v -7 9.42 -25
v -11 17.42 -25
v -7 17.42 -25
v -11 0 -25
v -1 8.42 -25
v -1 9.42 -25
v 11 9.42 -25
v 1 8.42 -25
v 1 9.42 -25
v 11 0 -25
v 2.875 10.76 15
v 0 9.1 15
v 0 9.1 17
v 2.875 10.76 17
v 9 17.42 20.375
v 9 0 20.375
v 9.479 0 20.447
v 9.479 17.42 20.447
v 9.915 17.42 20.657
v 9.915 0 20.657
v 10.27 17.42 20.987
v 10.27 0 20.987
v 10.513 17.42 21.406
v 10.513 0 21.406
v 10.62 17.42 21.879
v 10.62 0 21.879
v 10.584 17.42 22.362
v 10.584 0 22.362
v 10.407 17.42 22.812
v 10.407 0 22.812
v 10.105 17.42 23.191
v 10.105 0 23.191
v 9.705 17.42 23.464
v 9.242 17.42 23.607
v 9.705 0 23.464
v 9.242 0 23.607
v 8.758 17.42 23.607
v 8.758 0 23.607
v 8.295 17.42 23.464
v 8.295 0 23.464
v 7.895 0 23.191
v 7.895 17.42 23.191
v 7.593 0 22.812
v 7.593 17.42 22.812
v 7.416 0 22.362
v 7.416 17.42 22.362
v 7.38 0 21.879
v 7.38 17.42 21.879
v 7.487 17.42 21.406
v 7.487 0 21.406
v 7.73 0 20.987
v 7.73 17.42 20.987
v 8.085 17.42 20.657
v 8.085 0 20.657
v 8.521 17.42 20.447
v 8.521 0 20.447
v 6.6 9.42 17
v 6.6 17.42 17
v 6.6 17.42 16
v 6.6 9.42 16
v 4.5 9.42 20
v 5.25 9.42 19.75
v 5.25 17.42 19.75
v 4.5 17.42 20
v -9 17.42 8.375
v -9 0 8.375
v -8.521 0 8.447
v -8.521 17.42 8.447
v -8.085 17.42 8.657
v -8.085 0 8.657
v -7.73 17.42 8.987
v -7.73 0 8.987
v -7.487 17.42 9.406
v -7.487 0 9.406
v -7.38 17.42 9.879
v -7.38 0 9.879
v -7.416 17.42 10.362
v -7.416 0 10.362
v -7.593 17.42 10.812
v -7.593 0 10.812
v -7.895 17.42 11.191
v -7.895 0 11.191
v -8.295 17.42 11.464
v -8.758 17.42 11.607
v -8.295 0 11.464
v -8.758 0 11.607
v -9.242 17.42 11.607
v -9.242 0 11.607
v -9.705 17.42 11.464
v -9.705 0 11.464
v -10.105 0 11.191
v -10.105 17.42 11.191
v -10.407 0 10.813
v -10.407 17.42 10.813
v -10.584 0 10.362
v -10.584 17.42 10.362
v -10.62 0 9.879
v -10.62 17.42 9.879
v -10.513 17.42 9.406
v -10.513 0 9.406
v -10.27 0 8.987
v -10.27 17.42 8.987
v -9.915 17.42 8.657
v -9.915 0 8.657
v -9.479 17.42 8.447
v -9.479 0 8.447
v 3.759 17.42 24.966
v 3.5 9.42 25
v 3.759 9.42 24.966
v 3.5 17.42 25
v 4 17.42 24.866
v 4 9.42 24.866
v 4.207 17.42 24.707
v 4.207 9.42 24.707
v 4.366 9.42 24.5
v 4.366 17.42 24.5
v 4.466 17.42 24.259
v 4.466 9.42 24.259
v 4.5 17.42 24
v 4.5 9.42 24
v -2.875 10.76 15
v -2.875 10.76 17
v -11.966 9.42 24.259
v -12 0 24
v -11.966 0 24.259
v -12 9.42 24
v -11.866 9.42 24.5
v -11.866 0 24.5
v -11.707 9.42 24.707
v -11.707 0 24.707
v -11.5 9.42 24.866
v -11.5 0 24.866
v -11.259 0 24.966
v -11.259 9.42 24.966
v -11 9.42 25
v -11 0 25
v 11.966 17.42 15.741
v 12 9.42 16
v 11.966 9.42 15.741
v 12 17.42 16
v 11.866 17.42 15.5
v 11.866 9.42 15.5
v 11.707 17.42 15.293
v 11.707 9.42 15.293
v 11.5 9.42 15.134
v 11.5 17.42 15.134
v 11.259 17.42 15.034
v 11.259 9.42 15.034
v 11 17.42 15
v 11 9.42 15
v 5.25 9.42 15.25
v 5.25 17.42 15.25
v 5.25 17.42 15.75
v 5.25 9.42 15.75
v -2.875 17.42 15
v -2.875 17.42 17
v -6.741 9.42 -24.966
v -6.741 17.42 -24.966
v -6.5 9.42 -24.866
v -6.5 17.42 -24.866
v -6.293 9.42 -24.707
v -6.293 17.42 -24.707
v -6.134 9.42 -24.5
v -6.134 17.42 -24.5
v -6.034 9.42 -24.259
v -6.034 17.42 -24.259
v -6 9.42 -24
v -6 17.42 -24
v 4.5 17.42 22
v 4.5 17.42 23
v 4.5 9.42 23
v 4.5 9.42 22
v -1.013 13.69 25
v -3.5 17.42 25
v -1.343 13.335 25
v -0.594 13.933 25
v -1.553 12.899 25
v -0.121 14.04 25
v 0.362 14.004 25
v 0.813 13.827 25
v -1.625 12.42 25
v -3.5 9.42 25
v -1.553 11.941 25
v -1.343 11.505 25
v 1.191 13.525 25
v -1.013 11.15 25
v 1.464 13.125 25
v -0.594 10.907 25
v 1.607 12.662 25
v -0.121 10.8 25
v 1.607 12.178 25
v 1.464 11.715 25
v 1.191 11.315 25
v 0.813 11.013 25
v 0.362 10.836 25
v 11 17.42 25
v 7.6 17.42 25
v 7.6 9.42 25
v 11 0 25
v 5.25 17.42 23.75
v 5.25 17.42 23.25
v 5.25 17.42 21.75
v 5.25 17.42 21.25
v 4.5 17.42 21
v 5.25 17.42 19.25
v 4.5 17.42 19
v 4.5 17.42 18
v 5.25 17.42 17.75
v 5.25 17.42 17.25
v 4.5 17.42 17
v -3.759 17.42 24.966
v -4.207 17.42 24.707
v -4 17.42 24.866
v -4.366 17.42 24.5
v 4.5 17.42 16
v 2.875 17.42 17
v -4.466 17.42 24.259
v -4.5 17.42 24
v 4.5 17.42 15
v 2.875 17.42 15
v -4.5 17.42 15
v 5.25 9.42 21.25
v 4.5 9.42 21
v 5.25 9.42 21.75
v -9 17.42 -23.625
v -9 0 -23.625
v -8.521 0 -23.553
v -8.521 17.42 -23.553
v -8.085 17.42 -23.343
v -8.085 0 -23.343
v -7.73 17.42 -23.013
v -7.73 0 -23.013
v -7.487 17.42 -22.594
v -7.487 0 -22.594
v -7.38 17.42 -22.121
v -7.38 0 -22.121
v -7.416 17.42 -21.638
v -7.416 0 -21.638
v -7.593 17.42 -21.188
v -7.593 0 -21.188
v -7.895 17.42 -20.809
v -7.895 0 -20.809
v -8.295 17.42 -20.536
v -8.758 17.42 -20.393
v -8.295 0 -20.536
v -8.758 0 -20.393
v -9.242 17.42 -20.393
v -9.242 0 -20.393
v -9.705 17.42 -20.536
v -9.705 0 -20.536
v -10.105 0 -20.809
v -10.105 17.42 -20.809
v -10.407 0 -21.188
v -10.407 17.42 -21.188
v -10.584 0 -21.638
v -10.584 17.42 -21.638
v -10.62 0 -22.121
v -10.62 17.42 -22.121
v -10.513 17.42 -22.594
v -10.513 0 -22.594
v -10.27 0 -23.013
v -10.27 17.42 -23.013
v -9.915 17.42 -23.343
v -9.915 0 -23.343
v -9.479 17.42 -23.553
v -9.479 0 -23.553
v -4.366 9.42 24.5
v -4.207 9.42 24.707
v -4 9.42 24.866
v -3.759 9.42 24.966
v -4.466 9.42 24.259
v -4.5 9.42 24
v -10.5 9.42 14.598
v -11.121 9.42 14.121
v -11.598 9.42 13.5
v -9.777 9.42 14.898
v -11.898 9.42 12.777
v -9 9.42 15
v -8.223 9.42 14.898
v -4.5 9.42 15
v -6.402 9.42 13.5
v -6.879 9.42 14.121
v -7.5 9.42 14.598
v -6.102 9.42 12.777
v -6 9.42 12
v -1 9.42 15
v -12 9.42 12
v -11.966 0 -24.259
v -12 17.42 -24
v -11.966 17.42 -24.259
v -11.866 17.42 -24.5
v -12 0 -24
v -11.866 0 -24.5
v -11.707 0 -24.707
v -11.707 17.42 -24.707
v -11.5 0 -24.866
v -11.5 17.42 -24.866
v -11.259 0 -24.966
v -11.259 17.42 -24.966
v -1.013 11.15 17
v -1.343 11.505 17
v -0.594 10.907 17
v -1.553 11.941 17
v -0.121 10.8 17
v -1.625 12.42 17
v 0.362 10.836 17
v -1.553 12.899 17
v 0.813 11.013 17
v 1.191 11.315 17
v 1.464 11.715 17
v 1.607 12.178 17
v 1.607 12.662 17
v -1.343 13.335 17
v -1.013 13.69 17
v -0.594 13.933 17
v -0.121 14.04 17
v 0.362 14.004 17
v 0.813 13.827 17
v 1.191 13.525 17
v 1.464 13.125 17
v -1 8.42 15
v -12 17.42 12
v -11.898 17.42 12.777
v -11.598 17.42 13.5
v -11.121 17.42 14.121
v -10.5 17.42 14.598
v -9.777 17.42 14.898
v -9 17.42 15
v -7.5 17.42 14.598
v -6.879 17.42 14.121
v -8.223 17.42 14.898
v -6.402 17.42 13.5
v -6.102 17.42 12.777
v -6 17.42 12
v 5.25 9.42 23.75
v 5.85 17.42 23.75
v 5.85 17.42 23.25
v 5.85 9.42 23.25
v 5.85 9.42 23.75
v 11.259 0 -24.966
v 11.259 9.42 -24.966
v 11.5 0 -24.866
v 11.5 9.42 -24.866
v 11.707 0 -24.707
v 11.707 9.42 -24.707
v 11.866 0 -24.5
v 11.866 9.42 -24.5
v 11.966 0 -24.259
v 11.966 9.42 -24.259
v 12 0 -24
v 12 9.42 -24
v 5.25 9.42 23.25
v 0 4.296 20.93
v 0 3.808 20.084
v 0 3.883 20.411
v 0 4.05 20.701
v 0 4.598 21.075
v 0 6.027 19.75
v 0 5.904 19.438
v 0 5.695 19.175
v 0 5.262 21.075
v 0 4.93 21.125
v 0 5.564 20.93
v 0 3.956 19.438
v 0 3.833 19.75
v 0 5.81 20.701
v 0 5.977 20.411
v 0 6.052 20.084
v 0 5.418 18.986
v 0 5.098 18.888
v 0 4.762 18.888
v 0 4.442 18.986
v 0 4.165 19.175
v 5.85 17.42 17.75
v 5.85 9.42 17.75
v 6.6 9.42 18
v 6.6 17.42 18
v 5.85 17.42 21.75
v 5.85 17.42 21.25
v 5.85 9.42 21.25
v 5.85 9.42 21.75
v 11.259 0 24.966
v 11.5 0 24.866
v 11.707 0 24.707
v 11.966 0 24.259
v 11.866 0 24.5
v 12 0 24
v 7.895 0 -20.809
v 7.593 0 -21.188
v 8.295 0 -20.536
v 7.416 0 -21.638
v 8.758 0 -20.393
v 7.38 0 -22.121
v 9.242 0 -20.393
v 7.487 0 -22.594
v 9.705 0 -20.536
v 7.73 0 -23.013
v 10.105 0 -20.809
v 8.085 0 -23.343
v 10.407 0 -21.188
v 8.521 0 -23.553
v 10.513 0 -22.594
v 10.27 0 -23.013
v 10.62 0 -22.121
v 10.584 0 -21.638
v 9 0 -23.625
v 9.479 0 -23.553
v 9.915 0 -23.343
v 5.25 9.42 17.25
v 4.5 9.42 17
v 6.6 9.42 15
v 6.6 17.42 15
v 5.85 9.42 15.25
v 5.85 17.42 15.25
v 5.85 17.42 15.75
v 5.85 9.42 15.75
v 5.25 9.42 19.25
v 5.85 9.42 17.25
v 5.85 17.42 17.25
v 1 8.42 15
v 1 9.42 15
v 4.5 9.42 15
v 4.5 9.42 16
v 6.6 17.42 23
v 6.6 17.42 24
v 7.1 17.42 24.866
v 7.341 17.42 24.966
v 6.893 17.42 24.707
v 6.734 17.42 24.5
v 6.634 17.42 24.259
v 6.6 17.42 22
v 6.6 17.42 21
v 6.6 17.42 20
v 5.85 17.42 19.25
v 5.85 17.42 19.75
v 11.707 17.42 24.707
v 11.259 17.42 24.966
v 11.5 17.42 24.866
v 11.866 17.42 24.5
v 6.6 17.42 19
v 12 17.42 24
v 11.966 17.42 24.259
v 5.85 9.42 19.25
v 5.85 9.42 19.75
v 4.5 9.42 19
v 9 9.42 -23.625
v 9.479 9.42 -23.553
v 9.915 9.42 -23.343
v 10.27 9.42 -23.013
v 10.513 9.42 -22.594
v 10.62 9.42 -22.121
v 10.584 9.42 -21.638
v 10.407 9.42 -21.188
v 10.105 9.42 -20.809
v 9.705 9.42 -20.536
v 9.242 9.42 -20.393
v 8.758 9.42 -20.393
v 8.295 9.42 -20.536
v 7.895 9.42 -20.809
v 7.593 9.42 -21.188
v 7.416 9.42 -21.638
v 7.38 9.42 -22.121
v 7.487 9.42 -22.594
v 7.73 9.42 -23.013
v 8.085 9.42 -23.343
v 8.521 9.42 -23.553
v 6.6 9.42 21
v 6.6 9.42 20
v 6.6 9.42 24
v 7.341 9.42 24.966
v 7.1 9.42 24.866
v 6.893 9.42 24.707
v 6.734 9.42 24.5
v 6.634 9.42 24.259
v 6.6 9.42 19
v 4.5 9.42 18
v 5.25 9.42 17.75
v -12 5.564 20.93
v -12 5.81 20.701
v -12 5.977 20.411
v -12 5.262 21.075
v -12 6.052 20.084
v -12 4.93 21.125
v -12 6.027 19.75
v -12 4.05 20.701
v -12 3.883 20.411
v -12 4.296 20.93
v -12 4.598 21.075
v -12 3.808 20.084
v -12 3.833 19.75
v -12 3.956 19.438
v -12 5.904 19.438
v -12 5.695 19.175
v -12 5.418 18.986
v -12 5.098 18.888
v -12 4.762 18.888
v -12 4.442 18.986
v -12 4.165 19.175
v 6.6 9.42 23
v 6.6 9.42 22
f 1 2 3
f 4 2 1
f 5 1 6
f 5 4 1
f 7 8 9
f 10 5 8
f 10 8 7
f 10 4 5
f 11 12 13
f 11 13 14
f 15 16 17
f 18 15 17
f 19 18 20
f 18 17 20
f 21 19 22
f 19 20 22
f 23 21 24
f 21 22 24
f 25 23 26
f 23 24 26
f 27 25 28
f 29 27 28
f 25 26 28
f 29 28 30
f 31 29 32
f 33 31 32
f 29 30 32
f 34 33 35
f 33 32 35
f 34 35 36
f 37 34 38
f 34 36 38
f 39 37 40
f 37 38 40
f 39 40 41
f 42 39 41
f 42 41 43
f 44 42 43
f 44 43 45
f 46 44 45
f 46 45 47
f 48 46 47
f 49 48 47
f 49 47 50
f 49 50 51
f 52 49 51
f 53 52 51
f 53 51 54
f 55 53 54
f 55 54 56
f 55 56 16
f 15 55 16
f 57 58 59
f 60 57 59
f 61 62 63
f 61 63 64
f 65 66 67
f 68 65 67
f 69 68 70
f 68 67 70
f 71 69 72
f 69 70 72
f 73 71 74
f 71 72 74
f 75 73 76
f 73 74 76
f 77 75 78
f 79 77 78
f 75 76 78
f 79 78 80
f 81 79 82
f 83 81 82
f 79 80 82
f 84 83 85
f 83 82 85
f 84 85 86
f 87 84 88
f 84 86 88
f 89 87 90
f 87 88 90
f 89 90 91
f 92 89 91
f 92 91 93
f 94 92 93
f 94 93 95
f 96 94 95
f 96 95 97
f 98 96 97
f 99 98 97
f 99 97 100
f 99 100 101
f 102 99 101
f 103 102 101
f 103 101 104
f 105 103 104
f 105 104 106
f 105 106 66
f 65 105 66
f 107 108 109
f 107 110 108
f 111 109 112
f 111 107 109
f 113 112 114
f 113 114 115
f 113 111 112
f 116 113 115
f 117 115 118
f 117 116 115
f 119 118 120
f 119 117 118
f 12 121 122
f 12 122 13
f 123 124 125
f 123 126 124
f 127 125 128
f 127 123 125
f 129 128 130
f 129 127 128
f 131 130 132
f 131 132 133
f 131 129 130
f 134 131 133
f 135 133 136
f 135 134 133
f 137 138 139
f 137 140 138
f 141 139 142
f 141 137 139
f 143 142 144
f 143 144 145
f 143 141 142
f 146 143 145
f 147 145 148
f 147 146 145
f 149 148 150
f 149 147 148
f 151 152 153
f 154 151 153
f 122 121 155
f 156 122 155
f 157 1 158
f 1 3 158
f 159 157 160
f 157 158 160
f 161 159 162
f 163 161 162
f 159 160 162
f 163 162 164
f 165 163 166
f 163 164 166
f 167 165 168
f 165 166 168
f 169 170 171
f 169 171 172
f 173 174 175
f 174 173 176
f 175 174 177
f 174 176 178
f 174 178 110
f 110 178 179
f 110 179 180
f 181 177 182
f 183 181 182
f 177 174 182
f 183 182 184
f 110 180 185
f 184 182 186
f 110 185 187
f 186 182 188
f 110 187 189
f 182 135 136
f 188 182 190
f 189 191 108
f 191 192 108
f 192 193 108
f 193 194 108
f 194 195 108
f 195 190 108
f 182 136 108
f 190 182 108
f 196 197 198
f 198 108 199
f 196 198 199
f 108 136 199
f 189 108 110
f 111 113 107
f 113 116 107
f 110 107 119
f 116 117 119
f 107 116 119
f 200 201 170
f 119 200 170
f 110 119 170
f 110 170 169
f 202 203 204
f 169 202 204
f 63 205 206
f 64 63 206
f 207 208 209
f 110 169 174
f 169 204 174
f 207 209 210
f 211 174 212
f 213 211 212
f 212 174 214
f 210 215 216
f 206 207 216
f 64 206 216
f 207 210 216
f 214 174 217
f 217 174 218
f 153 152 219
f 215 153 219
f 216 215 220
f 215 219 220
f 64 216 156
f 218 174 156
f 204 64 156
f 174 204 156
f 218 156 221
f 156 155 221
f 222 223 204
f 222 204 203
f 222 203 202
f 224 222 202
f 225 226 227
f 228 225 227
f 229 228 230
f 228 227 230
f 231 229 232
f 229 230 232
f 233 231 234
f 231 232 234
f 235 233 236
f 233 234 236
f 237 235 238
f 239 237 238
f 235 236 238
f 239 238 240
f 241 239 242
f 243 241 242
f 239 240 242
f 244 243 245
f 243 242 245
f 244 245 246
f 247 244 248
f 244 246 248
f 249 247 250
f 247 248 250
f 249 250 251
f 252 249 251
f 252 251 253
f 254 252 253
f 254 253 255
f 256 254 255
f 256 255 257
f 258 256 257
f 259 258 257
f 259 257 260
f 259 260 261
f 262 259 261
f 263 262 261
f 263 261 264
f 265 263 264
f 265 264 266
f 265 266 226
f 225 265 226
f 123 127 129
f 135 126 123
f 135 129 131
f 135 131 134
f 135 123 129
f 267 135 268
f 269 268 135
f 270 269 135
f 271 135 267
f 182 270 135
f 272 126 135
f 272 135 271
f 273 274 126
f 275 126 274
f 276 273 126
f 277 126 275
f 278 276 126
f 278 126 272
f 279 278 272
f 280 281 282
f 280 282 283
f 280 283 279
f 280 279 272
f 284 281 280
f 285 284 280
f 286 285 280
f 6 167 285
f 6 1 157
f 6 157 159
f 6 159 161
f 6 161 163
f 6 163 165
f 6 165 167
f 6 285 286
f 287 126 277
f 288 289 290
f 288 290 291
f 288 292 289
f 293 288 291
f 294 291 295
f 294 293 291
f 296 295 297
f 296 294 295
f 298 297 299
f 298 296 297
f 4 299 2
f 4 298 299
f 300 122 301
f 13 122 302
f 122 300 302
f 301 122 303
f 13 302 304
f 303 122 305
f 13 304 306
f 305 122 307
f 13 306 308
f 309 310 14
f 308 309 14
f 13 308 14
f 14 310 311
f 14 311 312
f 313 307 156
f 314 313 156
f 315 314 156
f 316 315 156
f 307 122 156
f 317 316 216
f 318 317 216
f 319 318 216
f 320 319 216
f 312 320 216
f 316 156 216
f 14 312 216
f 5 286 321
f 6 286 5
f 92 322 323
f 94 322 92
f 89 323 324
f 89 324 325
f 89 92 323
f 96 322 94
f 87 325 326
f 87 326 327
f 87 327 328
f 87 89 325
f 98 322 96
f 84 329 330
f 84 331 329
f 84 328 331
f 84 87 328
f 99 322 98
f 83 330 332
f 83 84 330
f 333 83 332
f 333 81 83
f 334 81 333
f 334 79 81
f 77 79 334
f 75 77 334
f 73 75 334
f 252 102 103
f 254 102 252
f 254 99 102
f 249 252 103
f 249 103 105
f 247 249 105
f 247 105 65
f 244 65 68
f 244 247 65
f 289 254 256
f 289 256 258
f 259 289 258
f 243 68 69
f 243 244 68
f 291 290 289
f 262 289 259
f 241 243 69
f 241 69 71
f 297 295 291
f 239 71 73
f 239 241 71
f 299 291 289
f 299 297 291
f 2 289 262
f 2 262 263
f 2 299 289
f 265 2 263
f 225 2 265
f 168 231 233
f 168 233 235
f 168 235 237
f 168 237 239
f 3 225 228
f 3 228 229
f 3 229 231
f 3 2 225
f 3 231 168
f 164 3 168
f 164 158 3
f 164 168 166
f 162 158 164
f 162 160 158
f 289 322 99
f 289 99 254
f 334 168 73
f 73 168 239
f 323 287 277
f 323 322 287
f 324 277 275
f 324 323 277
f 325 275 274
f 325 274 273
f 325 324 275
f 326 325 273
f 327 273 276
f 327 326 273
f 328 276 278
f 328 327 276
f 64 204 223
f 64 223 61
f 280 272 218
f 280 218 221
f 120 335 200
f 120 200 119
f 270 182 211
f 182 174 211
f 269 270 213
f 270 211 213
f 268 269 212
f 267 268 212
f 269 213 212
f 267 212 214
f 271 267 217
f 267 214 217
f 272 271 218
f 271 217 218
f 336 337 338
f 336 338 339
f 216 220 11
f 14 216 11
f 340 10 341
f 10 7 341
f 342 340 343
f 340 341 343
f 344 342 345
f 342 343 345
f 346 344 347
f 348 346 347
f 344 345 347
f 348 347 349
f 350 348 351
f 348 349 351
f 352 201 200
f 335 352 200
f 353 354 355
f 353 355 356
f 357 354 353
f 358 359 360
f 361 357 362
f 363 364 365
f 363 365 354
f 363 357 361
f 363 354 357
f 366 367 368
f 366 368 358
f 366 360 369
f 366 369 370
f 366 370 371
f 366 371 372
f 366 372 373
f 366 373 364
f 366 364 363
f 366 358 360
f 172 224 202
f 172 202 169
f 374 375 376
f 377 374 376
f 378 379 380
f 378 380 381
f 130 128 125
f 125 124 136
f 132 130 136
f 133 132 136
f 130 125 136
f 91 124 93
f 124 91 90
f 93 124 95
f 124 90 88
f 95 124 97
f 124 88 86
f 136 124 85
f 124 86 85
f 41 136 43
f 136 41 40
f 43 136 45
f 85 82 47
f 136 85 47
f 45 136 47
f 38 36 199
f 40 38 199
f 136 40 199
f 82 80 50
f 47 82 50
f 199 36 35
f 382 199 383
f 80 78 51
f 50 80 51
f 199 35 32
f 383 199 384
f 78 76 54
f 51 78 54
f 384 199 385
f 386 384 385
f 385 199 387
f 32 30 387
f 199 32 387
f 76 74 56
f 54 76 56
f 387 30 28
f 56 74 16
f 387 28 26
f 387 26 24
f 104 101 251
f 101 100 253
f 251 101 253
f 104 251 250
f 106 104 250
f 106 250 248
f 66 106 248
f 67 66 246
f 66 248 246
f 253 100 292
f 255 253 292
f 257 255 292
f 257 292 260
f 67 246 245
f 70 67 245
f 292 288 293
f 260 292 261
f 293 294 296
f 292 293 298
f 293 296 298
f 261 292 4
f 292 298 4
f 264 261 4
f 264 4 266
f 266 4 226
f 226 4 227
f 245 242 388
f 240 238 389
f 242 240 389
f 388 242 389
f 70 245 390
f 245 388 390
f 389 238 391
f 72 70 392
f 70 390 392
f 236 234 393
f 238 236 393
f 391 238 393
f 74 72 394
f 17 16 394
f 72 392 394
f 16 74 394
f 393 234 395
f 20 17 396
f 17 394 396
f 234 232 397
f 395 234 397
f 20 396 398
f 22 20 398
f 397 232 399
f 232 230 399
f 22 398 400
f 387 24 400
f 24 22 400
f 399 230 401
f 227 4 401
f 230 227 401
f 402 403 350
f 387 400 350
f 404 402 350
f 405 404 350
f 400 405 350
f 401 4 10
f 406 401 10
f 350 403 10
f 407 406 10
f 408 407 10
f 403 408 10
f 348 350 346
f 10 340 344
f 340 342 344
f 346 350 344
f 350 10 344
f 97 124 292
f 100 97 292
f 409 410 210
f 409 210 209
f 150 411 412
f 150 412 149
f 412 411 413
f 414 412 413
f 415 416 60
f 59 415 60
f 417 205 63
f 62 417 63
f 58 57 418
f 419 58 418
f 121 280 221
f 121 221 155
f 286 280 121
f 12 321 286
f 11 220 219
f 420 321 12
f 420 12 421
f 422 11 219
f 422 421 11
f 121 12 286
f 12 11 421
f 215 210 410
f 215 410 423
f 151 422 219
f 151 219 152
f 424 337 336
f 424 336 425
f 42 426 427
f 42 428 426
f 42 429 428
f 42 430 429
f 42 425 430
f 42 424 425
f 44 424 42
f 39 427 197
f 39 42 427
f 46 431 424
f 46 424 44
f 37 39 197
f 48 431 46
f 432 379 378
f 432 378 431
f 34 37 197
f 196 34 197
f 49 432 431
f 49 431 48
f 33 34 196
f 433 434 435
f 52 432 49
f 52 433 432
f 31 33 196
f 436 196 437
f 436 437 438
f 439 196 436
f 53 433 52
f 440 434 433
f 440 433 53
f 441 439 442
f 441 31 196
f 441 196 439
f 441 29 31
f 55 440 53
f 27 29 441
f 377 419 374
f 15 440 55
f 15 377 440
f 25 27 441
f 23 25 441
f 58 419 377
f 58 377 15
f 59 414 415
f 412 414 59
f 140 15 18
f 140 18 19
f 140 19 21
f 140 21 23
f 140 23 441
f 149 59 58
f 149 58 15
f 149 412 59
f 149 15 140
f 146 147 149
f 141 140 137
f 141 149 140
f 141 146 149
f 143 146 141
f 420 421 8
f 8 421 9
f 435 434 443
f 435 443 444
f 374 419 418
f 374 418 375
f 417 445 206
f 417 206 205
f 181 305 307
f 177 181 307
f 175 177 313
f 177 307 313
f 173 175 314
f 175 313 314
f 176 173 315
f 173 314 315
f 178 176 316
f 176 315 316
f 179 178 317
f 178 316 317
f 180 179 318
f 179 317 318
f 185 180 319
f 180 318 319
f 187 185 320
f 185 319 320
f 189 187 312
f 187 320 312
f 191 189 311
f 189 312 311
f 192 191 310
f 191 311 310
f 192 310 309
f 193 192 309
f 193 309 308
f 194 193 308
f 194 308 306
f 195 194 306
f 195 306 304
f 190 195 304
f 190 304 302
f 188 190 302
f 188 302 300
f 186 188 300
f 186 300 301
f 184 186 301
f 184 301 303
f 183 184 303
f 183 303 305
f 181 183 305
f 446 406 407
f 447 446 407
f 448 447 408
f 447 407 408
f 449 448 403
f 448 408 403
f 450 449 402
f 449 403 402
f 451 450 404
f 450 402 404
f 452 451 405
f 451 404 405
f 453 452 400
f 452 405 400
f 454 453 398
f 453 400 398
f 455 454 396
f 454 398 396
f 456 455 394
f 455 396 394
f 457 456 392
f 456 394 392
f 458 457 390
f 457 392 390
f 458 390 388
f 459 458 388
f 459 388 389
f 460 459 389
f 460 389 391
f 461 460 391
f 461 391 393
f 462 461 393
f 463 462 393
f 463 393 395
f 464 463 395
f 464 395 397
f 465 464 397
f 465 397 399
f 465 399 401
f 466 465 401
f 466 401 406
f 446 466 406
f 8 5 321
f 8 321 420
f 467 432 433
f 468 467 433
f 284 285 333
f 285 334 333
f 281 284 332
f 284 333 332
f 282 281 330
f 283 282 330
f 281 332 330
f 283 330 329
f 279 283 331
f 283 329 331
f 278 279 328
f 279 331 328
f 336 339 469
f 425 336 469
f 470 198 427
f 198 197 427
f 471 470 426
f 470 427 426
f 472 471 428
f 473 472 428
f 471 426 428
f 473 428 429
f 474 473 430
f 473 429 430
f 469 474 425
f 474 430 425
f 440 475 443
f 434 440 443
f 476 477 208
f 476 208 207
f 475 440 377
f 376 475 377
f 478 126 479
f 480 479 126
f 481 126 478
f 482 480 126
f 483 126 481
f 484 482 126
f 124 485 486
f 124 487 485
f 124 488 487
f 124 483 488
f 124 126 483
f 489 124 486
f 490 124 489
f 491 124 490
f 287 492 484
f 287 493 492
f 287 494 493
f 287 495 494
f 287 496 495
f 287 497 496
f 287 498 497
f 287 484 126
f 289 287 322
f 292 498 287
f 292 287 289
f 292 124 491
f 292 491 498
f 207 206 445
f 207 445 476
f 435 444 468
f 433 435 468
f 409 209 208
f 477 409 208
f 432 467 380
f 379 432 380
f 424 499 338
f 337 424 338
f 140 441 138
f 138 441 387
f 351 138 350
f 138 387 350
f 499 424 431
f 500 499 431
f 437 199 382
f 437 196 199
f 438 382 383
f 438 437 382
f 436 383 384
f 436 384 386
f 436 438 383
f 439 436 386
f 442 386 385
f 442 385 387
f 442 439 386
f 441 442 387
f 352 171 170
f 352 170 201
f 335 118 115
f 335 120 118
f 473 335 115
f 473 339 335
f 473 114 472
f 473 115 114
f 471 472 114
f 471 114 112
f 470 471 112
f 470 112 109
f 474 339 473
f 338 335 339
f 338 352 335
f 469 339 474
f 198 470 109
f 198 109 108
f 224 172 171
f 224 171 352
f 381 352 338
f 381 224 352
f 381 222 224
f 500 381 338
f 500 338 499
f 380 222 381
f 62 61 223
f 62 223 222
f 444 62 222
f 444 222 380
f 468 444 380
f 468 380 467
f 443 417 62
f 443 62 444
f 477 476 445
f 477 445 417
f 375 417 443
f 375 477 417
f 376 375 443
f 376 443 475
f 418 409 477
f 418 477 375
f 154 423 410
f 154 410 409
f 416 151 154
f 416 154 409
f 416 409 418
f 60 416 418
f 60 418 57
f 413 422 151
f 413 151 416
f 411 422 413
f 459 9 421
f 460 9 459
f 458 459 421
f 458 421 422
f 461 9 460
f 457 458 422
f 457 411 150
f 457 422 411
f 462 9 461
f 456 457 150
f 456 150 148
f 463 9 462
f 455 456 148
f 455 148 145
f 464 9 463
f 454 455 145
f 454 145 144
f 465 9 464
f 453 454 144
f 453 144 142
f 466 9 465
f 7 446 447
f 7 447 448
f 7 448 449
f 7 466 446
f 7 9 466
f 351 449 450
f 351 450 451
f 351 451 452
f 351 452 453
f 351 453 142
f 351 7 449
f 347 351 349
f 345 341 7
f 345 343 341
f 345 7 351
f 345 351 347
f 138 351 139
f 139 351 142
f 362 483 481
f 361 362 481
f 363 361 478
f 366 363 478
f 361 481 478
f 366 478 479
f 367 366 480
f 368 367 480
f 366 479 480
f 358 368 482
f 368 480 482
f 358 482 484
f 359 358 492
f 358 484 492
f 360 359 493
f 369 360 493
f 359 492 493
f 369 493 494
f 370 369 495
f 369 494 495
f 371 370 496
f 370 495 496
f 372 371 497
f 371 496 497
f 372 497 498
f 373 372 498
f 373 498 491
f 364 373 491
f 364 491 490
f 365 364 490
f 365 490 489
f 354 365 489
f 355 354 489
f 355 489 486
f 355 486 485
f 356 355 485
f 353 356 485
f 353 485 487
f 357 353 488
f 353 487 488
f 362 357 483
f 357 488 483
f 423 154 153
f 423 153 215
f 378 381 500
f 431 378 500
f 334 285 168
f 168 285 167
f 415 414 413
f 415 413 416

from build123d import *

# Parameters (mm, degrees)
SKETCH1_W           = 24
SKETCH1_H           = 50
BOSS_EXTRUDE1_DEPTH = 9.42
SKETCH2_W           = 6
SKETCH2_H           = 40
SKETCH2_W_2         = 9
SKETCH2_H_2         = 10
SKETCH2_W_3         = 5.4
BOSS_EXTRUDE2_DEPTH = 8
FILLET1_R           = 3
SKETCH4_R           = 1.625
CUT_EXTRUDE2_DEPTH  = 46.248827609
CUT_EXTRUDE3_DEPTH  = 2
SKETCH6_W           = 2
SKETCH6_H           = 40
CUT_EXTRUDE4_DEPTH  = 1
SKETCH7_R           = 1.125
CUT_EXTRUDE5_DEPTH  = 12
SKETCH9_R           = 1.625
CUT_EXTRUDE6_DEPTH  = 33.748380113
FILLET2_R           = 1
BOSS_EXTRUDE3_DEPTH = 8
LPATTERN1_COUNT     = 5
LPATTERN1_PITCH     = 2


with BuildPart() as part:
    # Sketch1 → Boss-Extrude1 (new body)
    with BuildSketch(Plane(origin=(0, 0, 0), x_dir=(1, 0, 0), z_dir=(0, 1, 0))):
        Rectangle(SKETCH1_W, SKETCH1_H)
    extrude(amount=BOSS_EXTRUDE1_DEPTH)

    # Sketch2 → Boss-Extrude2 (add)
    with BuildSketch(Plane(origin=(0, 9.42, 0), x_dir=(1, 0, 0), z_dir=(0, 1, 0))):
        with Locations((-9, 5)):
            Rectangle(SKETCH2_W, SKETCH2_H)
        with Locations((0, -20)):
            Rectangle(SKETCH2_W_2, SKETCH2_H_2)
        with Locations((9.3, -20)):
            Rectangle(SKETCH2_W_3, SKETCH2_H_2)
    extrude(amount=BOSS_EXTRUDE2_DEPTH)

    # Fillet1
    fillet1_edges = [part.edges().sort_by_distance(p)[0] for p in [
        (-12, 13.42, 15),
        (-6, 13.42, 15),
    ]]
    fillet(fillet1_edges, radius=FILLET1_R - 0.0001)  # a hair under: the kernel refuses the full size

    # Sketch4 → Cut-Extrude2 (cut, through all)
    with BuildSketch(Plane(origin=(0, 0, 15), x_dir=(-1, 0, 0), z_dir=(0, 0, -1))):
        with Locations((0, 12.42)):
            Circle(SKETCH4_R)
    extrude(amount=-CUT_EXTRUDE2_DEPTH, mode=Mode.SUBTRACT)

    # Sketch5 → Cut-Extrude3 (cut)
    with BuildSketch(Plane(origin=(0, 0, 15), x_dir=(-1, 0, 0), z_dir=(0, 0, -1))):
        Polygon((-2.875, 14.079882024), (-2.875, 17.42), (2.875, 17.42), (2.875, 14.079882024), (2.875, 10.760117976), (0, 9.100235952), (-2.875, 10.760117976), align=None)
    extrude(amount=-CUT_EXTRUDE3_DEPTH, mode=Mode.SUBTRACT)

    # Sketch6 → Cut-Extrude4 (cut)
    with BuildSketch(Plane(origin=(0, 9.42, 0), x_dir=(1, 0, 0), z_dir=(0, 1, 0))):
        with Locations((0, 5)):
            Rectangle(SKETCH6_W, SKETCH6_H)
    extrude(amount=-CUT_EXTRUDE4_DEPTH, mode=Mode.SUBTRACT)

    # Sketch7 → Cut-Extrude5 (cut)
    with BuildSketch(Plane.ZY.offset(12)):
        with Locations((20, 4.93)):
            Circle(SKETCH7_R)
    extrude(amount=-CUT_EXTRUDE5_DEPTH, mode=Mode.SUBTRACT)

    # Sketch9 → Cut-Extrude6 (cut, through all)
    with BuildSketch(Plane.XZ):
        with Locations(Location((9, 22, 0), (0, 0, 270))):
            Circle(SKETCH9_R)
        with Locations(Location((9, -22, 0), (0, 0, 270))):
            Circle(SKETCH9_R)
        with Locations(Location((-9, -22, 0), (0, 0, 270))):
            Circle(SKETCH9_R)
        with Locations(Location((-9, 10, 0), (0, 0, 270))):
            Circle(SKETCH9_R)
    extrude(amount=-CUT_EXTRUDE6_DEPTH, mode=Mode.SUBTRACT)

    # Fillet2
    fillet2_edges = [part.edges().sort_by_distance(p)[0] for p in [
        (-6, 13.42, -25),
        (-4.5, 13.42, 25),
        (4.5, 13.42, 25),
        (12, 13.42, 15),
        (6.6, 13.42, 25),
        (-12, 8.71, -25),
        (12, 4.71, -25),
        (12, 8.71, 25),
        (-12, 4.71, 25),
    ]]
    fillet(fillet2_edges, radius=FILLET2_R)

    # Sketch10 → Boss-Extrude3 (add)
    with BuildSketch(Plane(origin=(0, 9.42, 0), x_dir=(1, 0, 0), z_dir=(0, 1, 0))):
        Polygon((4.5, -24), (4.5, -23), (5.25, -23.25), (5.25, -23.75), align=None)
        Polygon((6.6, -24), (6.6, -23), (5.85, -23.25), (5.85, -23.75), align=None)
    boss_extrude3 = extrude(amount=BOSS_EXTRUDE3_DEPTH)

    # LPattern1: Boss-Extrude3 ×5
    with Locations(*[(0, 0, -i * LPATTERN1_PITCH) for i in range(1, LPATTERN1_COUNT)]):
        add(boss_extrude3)


solid = part.part
